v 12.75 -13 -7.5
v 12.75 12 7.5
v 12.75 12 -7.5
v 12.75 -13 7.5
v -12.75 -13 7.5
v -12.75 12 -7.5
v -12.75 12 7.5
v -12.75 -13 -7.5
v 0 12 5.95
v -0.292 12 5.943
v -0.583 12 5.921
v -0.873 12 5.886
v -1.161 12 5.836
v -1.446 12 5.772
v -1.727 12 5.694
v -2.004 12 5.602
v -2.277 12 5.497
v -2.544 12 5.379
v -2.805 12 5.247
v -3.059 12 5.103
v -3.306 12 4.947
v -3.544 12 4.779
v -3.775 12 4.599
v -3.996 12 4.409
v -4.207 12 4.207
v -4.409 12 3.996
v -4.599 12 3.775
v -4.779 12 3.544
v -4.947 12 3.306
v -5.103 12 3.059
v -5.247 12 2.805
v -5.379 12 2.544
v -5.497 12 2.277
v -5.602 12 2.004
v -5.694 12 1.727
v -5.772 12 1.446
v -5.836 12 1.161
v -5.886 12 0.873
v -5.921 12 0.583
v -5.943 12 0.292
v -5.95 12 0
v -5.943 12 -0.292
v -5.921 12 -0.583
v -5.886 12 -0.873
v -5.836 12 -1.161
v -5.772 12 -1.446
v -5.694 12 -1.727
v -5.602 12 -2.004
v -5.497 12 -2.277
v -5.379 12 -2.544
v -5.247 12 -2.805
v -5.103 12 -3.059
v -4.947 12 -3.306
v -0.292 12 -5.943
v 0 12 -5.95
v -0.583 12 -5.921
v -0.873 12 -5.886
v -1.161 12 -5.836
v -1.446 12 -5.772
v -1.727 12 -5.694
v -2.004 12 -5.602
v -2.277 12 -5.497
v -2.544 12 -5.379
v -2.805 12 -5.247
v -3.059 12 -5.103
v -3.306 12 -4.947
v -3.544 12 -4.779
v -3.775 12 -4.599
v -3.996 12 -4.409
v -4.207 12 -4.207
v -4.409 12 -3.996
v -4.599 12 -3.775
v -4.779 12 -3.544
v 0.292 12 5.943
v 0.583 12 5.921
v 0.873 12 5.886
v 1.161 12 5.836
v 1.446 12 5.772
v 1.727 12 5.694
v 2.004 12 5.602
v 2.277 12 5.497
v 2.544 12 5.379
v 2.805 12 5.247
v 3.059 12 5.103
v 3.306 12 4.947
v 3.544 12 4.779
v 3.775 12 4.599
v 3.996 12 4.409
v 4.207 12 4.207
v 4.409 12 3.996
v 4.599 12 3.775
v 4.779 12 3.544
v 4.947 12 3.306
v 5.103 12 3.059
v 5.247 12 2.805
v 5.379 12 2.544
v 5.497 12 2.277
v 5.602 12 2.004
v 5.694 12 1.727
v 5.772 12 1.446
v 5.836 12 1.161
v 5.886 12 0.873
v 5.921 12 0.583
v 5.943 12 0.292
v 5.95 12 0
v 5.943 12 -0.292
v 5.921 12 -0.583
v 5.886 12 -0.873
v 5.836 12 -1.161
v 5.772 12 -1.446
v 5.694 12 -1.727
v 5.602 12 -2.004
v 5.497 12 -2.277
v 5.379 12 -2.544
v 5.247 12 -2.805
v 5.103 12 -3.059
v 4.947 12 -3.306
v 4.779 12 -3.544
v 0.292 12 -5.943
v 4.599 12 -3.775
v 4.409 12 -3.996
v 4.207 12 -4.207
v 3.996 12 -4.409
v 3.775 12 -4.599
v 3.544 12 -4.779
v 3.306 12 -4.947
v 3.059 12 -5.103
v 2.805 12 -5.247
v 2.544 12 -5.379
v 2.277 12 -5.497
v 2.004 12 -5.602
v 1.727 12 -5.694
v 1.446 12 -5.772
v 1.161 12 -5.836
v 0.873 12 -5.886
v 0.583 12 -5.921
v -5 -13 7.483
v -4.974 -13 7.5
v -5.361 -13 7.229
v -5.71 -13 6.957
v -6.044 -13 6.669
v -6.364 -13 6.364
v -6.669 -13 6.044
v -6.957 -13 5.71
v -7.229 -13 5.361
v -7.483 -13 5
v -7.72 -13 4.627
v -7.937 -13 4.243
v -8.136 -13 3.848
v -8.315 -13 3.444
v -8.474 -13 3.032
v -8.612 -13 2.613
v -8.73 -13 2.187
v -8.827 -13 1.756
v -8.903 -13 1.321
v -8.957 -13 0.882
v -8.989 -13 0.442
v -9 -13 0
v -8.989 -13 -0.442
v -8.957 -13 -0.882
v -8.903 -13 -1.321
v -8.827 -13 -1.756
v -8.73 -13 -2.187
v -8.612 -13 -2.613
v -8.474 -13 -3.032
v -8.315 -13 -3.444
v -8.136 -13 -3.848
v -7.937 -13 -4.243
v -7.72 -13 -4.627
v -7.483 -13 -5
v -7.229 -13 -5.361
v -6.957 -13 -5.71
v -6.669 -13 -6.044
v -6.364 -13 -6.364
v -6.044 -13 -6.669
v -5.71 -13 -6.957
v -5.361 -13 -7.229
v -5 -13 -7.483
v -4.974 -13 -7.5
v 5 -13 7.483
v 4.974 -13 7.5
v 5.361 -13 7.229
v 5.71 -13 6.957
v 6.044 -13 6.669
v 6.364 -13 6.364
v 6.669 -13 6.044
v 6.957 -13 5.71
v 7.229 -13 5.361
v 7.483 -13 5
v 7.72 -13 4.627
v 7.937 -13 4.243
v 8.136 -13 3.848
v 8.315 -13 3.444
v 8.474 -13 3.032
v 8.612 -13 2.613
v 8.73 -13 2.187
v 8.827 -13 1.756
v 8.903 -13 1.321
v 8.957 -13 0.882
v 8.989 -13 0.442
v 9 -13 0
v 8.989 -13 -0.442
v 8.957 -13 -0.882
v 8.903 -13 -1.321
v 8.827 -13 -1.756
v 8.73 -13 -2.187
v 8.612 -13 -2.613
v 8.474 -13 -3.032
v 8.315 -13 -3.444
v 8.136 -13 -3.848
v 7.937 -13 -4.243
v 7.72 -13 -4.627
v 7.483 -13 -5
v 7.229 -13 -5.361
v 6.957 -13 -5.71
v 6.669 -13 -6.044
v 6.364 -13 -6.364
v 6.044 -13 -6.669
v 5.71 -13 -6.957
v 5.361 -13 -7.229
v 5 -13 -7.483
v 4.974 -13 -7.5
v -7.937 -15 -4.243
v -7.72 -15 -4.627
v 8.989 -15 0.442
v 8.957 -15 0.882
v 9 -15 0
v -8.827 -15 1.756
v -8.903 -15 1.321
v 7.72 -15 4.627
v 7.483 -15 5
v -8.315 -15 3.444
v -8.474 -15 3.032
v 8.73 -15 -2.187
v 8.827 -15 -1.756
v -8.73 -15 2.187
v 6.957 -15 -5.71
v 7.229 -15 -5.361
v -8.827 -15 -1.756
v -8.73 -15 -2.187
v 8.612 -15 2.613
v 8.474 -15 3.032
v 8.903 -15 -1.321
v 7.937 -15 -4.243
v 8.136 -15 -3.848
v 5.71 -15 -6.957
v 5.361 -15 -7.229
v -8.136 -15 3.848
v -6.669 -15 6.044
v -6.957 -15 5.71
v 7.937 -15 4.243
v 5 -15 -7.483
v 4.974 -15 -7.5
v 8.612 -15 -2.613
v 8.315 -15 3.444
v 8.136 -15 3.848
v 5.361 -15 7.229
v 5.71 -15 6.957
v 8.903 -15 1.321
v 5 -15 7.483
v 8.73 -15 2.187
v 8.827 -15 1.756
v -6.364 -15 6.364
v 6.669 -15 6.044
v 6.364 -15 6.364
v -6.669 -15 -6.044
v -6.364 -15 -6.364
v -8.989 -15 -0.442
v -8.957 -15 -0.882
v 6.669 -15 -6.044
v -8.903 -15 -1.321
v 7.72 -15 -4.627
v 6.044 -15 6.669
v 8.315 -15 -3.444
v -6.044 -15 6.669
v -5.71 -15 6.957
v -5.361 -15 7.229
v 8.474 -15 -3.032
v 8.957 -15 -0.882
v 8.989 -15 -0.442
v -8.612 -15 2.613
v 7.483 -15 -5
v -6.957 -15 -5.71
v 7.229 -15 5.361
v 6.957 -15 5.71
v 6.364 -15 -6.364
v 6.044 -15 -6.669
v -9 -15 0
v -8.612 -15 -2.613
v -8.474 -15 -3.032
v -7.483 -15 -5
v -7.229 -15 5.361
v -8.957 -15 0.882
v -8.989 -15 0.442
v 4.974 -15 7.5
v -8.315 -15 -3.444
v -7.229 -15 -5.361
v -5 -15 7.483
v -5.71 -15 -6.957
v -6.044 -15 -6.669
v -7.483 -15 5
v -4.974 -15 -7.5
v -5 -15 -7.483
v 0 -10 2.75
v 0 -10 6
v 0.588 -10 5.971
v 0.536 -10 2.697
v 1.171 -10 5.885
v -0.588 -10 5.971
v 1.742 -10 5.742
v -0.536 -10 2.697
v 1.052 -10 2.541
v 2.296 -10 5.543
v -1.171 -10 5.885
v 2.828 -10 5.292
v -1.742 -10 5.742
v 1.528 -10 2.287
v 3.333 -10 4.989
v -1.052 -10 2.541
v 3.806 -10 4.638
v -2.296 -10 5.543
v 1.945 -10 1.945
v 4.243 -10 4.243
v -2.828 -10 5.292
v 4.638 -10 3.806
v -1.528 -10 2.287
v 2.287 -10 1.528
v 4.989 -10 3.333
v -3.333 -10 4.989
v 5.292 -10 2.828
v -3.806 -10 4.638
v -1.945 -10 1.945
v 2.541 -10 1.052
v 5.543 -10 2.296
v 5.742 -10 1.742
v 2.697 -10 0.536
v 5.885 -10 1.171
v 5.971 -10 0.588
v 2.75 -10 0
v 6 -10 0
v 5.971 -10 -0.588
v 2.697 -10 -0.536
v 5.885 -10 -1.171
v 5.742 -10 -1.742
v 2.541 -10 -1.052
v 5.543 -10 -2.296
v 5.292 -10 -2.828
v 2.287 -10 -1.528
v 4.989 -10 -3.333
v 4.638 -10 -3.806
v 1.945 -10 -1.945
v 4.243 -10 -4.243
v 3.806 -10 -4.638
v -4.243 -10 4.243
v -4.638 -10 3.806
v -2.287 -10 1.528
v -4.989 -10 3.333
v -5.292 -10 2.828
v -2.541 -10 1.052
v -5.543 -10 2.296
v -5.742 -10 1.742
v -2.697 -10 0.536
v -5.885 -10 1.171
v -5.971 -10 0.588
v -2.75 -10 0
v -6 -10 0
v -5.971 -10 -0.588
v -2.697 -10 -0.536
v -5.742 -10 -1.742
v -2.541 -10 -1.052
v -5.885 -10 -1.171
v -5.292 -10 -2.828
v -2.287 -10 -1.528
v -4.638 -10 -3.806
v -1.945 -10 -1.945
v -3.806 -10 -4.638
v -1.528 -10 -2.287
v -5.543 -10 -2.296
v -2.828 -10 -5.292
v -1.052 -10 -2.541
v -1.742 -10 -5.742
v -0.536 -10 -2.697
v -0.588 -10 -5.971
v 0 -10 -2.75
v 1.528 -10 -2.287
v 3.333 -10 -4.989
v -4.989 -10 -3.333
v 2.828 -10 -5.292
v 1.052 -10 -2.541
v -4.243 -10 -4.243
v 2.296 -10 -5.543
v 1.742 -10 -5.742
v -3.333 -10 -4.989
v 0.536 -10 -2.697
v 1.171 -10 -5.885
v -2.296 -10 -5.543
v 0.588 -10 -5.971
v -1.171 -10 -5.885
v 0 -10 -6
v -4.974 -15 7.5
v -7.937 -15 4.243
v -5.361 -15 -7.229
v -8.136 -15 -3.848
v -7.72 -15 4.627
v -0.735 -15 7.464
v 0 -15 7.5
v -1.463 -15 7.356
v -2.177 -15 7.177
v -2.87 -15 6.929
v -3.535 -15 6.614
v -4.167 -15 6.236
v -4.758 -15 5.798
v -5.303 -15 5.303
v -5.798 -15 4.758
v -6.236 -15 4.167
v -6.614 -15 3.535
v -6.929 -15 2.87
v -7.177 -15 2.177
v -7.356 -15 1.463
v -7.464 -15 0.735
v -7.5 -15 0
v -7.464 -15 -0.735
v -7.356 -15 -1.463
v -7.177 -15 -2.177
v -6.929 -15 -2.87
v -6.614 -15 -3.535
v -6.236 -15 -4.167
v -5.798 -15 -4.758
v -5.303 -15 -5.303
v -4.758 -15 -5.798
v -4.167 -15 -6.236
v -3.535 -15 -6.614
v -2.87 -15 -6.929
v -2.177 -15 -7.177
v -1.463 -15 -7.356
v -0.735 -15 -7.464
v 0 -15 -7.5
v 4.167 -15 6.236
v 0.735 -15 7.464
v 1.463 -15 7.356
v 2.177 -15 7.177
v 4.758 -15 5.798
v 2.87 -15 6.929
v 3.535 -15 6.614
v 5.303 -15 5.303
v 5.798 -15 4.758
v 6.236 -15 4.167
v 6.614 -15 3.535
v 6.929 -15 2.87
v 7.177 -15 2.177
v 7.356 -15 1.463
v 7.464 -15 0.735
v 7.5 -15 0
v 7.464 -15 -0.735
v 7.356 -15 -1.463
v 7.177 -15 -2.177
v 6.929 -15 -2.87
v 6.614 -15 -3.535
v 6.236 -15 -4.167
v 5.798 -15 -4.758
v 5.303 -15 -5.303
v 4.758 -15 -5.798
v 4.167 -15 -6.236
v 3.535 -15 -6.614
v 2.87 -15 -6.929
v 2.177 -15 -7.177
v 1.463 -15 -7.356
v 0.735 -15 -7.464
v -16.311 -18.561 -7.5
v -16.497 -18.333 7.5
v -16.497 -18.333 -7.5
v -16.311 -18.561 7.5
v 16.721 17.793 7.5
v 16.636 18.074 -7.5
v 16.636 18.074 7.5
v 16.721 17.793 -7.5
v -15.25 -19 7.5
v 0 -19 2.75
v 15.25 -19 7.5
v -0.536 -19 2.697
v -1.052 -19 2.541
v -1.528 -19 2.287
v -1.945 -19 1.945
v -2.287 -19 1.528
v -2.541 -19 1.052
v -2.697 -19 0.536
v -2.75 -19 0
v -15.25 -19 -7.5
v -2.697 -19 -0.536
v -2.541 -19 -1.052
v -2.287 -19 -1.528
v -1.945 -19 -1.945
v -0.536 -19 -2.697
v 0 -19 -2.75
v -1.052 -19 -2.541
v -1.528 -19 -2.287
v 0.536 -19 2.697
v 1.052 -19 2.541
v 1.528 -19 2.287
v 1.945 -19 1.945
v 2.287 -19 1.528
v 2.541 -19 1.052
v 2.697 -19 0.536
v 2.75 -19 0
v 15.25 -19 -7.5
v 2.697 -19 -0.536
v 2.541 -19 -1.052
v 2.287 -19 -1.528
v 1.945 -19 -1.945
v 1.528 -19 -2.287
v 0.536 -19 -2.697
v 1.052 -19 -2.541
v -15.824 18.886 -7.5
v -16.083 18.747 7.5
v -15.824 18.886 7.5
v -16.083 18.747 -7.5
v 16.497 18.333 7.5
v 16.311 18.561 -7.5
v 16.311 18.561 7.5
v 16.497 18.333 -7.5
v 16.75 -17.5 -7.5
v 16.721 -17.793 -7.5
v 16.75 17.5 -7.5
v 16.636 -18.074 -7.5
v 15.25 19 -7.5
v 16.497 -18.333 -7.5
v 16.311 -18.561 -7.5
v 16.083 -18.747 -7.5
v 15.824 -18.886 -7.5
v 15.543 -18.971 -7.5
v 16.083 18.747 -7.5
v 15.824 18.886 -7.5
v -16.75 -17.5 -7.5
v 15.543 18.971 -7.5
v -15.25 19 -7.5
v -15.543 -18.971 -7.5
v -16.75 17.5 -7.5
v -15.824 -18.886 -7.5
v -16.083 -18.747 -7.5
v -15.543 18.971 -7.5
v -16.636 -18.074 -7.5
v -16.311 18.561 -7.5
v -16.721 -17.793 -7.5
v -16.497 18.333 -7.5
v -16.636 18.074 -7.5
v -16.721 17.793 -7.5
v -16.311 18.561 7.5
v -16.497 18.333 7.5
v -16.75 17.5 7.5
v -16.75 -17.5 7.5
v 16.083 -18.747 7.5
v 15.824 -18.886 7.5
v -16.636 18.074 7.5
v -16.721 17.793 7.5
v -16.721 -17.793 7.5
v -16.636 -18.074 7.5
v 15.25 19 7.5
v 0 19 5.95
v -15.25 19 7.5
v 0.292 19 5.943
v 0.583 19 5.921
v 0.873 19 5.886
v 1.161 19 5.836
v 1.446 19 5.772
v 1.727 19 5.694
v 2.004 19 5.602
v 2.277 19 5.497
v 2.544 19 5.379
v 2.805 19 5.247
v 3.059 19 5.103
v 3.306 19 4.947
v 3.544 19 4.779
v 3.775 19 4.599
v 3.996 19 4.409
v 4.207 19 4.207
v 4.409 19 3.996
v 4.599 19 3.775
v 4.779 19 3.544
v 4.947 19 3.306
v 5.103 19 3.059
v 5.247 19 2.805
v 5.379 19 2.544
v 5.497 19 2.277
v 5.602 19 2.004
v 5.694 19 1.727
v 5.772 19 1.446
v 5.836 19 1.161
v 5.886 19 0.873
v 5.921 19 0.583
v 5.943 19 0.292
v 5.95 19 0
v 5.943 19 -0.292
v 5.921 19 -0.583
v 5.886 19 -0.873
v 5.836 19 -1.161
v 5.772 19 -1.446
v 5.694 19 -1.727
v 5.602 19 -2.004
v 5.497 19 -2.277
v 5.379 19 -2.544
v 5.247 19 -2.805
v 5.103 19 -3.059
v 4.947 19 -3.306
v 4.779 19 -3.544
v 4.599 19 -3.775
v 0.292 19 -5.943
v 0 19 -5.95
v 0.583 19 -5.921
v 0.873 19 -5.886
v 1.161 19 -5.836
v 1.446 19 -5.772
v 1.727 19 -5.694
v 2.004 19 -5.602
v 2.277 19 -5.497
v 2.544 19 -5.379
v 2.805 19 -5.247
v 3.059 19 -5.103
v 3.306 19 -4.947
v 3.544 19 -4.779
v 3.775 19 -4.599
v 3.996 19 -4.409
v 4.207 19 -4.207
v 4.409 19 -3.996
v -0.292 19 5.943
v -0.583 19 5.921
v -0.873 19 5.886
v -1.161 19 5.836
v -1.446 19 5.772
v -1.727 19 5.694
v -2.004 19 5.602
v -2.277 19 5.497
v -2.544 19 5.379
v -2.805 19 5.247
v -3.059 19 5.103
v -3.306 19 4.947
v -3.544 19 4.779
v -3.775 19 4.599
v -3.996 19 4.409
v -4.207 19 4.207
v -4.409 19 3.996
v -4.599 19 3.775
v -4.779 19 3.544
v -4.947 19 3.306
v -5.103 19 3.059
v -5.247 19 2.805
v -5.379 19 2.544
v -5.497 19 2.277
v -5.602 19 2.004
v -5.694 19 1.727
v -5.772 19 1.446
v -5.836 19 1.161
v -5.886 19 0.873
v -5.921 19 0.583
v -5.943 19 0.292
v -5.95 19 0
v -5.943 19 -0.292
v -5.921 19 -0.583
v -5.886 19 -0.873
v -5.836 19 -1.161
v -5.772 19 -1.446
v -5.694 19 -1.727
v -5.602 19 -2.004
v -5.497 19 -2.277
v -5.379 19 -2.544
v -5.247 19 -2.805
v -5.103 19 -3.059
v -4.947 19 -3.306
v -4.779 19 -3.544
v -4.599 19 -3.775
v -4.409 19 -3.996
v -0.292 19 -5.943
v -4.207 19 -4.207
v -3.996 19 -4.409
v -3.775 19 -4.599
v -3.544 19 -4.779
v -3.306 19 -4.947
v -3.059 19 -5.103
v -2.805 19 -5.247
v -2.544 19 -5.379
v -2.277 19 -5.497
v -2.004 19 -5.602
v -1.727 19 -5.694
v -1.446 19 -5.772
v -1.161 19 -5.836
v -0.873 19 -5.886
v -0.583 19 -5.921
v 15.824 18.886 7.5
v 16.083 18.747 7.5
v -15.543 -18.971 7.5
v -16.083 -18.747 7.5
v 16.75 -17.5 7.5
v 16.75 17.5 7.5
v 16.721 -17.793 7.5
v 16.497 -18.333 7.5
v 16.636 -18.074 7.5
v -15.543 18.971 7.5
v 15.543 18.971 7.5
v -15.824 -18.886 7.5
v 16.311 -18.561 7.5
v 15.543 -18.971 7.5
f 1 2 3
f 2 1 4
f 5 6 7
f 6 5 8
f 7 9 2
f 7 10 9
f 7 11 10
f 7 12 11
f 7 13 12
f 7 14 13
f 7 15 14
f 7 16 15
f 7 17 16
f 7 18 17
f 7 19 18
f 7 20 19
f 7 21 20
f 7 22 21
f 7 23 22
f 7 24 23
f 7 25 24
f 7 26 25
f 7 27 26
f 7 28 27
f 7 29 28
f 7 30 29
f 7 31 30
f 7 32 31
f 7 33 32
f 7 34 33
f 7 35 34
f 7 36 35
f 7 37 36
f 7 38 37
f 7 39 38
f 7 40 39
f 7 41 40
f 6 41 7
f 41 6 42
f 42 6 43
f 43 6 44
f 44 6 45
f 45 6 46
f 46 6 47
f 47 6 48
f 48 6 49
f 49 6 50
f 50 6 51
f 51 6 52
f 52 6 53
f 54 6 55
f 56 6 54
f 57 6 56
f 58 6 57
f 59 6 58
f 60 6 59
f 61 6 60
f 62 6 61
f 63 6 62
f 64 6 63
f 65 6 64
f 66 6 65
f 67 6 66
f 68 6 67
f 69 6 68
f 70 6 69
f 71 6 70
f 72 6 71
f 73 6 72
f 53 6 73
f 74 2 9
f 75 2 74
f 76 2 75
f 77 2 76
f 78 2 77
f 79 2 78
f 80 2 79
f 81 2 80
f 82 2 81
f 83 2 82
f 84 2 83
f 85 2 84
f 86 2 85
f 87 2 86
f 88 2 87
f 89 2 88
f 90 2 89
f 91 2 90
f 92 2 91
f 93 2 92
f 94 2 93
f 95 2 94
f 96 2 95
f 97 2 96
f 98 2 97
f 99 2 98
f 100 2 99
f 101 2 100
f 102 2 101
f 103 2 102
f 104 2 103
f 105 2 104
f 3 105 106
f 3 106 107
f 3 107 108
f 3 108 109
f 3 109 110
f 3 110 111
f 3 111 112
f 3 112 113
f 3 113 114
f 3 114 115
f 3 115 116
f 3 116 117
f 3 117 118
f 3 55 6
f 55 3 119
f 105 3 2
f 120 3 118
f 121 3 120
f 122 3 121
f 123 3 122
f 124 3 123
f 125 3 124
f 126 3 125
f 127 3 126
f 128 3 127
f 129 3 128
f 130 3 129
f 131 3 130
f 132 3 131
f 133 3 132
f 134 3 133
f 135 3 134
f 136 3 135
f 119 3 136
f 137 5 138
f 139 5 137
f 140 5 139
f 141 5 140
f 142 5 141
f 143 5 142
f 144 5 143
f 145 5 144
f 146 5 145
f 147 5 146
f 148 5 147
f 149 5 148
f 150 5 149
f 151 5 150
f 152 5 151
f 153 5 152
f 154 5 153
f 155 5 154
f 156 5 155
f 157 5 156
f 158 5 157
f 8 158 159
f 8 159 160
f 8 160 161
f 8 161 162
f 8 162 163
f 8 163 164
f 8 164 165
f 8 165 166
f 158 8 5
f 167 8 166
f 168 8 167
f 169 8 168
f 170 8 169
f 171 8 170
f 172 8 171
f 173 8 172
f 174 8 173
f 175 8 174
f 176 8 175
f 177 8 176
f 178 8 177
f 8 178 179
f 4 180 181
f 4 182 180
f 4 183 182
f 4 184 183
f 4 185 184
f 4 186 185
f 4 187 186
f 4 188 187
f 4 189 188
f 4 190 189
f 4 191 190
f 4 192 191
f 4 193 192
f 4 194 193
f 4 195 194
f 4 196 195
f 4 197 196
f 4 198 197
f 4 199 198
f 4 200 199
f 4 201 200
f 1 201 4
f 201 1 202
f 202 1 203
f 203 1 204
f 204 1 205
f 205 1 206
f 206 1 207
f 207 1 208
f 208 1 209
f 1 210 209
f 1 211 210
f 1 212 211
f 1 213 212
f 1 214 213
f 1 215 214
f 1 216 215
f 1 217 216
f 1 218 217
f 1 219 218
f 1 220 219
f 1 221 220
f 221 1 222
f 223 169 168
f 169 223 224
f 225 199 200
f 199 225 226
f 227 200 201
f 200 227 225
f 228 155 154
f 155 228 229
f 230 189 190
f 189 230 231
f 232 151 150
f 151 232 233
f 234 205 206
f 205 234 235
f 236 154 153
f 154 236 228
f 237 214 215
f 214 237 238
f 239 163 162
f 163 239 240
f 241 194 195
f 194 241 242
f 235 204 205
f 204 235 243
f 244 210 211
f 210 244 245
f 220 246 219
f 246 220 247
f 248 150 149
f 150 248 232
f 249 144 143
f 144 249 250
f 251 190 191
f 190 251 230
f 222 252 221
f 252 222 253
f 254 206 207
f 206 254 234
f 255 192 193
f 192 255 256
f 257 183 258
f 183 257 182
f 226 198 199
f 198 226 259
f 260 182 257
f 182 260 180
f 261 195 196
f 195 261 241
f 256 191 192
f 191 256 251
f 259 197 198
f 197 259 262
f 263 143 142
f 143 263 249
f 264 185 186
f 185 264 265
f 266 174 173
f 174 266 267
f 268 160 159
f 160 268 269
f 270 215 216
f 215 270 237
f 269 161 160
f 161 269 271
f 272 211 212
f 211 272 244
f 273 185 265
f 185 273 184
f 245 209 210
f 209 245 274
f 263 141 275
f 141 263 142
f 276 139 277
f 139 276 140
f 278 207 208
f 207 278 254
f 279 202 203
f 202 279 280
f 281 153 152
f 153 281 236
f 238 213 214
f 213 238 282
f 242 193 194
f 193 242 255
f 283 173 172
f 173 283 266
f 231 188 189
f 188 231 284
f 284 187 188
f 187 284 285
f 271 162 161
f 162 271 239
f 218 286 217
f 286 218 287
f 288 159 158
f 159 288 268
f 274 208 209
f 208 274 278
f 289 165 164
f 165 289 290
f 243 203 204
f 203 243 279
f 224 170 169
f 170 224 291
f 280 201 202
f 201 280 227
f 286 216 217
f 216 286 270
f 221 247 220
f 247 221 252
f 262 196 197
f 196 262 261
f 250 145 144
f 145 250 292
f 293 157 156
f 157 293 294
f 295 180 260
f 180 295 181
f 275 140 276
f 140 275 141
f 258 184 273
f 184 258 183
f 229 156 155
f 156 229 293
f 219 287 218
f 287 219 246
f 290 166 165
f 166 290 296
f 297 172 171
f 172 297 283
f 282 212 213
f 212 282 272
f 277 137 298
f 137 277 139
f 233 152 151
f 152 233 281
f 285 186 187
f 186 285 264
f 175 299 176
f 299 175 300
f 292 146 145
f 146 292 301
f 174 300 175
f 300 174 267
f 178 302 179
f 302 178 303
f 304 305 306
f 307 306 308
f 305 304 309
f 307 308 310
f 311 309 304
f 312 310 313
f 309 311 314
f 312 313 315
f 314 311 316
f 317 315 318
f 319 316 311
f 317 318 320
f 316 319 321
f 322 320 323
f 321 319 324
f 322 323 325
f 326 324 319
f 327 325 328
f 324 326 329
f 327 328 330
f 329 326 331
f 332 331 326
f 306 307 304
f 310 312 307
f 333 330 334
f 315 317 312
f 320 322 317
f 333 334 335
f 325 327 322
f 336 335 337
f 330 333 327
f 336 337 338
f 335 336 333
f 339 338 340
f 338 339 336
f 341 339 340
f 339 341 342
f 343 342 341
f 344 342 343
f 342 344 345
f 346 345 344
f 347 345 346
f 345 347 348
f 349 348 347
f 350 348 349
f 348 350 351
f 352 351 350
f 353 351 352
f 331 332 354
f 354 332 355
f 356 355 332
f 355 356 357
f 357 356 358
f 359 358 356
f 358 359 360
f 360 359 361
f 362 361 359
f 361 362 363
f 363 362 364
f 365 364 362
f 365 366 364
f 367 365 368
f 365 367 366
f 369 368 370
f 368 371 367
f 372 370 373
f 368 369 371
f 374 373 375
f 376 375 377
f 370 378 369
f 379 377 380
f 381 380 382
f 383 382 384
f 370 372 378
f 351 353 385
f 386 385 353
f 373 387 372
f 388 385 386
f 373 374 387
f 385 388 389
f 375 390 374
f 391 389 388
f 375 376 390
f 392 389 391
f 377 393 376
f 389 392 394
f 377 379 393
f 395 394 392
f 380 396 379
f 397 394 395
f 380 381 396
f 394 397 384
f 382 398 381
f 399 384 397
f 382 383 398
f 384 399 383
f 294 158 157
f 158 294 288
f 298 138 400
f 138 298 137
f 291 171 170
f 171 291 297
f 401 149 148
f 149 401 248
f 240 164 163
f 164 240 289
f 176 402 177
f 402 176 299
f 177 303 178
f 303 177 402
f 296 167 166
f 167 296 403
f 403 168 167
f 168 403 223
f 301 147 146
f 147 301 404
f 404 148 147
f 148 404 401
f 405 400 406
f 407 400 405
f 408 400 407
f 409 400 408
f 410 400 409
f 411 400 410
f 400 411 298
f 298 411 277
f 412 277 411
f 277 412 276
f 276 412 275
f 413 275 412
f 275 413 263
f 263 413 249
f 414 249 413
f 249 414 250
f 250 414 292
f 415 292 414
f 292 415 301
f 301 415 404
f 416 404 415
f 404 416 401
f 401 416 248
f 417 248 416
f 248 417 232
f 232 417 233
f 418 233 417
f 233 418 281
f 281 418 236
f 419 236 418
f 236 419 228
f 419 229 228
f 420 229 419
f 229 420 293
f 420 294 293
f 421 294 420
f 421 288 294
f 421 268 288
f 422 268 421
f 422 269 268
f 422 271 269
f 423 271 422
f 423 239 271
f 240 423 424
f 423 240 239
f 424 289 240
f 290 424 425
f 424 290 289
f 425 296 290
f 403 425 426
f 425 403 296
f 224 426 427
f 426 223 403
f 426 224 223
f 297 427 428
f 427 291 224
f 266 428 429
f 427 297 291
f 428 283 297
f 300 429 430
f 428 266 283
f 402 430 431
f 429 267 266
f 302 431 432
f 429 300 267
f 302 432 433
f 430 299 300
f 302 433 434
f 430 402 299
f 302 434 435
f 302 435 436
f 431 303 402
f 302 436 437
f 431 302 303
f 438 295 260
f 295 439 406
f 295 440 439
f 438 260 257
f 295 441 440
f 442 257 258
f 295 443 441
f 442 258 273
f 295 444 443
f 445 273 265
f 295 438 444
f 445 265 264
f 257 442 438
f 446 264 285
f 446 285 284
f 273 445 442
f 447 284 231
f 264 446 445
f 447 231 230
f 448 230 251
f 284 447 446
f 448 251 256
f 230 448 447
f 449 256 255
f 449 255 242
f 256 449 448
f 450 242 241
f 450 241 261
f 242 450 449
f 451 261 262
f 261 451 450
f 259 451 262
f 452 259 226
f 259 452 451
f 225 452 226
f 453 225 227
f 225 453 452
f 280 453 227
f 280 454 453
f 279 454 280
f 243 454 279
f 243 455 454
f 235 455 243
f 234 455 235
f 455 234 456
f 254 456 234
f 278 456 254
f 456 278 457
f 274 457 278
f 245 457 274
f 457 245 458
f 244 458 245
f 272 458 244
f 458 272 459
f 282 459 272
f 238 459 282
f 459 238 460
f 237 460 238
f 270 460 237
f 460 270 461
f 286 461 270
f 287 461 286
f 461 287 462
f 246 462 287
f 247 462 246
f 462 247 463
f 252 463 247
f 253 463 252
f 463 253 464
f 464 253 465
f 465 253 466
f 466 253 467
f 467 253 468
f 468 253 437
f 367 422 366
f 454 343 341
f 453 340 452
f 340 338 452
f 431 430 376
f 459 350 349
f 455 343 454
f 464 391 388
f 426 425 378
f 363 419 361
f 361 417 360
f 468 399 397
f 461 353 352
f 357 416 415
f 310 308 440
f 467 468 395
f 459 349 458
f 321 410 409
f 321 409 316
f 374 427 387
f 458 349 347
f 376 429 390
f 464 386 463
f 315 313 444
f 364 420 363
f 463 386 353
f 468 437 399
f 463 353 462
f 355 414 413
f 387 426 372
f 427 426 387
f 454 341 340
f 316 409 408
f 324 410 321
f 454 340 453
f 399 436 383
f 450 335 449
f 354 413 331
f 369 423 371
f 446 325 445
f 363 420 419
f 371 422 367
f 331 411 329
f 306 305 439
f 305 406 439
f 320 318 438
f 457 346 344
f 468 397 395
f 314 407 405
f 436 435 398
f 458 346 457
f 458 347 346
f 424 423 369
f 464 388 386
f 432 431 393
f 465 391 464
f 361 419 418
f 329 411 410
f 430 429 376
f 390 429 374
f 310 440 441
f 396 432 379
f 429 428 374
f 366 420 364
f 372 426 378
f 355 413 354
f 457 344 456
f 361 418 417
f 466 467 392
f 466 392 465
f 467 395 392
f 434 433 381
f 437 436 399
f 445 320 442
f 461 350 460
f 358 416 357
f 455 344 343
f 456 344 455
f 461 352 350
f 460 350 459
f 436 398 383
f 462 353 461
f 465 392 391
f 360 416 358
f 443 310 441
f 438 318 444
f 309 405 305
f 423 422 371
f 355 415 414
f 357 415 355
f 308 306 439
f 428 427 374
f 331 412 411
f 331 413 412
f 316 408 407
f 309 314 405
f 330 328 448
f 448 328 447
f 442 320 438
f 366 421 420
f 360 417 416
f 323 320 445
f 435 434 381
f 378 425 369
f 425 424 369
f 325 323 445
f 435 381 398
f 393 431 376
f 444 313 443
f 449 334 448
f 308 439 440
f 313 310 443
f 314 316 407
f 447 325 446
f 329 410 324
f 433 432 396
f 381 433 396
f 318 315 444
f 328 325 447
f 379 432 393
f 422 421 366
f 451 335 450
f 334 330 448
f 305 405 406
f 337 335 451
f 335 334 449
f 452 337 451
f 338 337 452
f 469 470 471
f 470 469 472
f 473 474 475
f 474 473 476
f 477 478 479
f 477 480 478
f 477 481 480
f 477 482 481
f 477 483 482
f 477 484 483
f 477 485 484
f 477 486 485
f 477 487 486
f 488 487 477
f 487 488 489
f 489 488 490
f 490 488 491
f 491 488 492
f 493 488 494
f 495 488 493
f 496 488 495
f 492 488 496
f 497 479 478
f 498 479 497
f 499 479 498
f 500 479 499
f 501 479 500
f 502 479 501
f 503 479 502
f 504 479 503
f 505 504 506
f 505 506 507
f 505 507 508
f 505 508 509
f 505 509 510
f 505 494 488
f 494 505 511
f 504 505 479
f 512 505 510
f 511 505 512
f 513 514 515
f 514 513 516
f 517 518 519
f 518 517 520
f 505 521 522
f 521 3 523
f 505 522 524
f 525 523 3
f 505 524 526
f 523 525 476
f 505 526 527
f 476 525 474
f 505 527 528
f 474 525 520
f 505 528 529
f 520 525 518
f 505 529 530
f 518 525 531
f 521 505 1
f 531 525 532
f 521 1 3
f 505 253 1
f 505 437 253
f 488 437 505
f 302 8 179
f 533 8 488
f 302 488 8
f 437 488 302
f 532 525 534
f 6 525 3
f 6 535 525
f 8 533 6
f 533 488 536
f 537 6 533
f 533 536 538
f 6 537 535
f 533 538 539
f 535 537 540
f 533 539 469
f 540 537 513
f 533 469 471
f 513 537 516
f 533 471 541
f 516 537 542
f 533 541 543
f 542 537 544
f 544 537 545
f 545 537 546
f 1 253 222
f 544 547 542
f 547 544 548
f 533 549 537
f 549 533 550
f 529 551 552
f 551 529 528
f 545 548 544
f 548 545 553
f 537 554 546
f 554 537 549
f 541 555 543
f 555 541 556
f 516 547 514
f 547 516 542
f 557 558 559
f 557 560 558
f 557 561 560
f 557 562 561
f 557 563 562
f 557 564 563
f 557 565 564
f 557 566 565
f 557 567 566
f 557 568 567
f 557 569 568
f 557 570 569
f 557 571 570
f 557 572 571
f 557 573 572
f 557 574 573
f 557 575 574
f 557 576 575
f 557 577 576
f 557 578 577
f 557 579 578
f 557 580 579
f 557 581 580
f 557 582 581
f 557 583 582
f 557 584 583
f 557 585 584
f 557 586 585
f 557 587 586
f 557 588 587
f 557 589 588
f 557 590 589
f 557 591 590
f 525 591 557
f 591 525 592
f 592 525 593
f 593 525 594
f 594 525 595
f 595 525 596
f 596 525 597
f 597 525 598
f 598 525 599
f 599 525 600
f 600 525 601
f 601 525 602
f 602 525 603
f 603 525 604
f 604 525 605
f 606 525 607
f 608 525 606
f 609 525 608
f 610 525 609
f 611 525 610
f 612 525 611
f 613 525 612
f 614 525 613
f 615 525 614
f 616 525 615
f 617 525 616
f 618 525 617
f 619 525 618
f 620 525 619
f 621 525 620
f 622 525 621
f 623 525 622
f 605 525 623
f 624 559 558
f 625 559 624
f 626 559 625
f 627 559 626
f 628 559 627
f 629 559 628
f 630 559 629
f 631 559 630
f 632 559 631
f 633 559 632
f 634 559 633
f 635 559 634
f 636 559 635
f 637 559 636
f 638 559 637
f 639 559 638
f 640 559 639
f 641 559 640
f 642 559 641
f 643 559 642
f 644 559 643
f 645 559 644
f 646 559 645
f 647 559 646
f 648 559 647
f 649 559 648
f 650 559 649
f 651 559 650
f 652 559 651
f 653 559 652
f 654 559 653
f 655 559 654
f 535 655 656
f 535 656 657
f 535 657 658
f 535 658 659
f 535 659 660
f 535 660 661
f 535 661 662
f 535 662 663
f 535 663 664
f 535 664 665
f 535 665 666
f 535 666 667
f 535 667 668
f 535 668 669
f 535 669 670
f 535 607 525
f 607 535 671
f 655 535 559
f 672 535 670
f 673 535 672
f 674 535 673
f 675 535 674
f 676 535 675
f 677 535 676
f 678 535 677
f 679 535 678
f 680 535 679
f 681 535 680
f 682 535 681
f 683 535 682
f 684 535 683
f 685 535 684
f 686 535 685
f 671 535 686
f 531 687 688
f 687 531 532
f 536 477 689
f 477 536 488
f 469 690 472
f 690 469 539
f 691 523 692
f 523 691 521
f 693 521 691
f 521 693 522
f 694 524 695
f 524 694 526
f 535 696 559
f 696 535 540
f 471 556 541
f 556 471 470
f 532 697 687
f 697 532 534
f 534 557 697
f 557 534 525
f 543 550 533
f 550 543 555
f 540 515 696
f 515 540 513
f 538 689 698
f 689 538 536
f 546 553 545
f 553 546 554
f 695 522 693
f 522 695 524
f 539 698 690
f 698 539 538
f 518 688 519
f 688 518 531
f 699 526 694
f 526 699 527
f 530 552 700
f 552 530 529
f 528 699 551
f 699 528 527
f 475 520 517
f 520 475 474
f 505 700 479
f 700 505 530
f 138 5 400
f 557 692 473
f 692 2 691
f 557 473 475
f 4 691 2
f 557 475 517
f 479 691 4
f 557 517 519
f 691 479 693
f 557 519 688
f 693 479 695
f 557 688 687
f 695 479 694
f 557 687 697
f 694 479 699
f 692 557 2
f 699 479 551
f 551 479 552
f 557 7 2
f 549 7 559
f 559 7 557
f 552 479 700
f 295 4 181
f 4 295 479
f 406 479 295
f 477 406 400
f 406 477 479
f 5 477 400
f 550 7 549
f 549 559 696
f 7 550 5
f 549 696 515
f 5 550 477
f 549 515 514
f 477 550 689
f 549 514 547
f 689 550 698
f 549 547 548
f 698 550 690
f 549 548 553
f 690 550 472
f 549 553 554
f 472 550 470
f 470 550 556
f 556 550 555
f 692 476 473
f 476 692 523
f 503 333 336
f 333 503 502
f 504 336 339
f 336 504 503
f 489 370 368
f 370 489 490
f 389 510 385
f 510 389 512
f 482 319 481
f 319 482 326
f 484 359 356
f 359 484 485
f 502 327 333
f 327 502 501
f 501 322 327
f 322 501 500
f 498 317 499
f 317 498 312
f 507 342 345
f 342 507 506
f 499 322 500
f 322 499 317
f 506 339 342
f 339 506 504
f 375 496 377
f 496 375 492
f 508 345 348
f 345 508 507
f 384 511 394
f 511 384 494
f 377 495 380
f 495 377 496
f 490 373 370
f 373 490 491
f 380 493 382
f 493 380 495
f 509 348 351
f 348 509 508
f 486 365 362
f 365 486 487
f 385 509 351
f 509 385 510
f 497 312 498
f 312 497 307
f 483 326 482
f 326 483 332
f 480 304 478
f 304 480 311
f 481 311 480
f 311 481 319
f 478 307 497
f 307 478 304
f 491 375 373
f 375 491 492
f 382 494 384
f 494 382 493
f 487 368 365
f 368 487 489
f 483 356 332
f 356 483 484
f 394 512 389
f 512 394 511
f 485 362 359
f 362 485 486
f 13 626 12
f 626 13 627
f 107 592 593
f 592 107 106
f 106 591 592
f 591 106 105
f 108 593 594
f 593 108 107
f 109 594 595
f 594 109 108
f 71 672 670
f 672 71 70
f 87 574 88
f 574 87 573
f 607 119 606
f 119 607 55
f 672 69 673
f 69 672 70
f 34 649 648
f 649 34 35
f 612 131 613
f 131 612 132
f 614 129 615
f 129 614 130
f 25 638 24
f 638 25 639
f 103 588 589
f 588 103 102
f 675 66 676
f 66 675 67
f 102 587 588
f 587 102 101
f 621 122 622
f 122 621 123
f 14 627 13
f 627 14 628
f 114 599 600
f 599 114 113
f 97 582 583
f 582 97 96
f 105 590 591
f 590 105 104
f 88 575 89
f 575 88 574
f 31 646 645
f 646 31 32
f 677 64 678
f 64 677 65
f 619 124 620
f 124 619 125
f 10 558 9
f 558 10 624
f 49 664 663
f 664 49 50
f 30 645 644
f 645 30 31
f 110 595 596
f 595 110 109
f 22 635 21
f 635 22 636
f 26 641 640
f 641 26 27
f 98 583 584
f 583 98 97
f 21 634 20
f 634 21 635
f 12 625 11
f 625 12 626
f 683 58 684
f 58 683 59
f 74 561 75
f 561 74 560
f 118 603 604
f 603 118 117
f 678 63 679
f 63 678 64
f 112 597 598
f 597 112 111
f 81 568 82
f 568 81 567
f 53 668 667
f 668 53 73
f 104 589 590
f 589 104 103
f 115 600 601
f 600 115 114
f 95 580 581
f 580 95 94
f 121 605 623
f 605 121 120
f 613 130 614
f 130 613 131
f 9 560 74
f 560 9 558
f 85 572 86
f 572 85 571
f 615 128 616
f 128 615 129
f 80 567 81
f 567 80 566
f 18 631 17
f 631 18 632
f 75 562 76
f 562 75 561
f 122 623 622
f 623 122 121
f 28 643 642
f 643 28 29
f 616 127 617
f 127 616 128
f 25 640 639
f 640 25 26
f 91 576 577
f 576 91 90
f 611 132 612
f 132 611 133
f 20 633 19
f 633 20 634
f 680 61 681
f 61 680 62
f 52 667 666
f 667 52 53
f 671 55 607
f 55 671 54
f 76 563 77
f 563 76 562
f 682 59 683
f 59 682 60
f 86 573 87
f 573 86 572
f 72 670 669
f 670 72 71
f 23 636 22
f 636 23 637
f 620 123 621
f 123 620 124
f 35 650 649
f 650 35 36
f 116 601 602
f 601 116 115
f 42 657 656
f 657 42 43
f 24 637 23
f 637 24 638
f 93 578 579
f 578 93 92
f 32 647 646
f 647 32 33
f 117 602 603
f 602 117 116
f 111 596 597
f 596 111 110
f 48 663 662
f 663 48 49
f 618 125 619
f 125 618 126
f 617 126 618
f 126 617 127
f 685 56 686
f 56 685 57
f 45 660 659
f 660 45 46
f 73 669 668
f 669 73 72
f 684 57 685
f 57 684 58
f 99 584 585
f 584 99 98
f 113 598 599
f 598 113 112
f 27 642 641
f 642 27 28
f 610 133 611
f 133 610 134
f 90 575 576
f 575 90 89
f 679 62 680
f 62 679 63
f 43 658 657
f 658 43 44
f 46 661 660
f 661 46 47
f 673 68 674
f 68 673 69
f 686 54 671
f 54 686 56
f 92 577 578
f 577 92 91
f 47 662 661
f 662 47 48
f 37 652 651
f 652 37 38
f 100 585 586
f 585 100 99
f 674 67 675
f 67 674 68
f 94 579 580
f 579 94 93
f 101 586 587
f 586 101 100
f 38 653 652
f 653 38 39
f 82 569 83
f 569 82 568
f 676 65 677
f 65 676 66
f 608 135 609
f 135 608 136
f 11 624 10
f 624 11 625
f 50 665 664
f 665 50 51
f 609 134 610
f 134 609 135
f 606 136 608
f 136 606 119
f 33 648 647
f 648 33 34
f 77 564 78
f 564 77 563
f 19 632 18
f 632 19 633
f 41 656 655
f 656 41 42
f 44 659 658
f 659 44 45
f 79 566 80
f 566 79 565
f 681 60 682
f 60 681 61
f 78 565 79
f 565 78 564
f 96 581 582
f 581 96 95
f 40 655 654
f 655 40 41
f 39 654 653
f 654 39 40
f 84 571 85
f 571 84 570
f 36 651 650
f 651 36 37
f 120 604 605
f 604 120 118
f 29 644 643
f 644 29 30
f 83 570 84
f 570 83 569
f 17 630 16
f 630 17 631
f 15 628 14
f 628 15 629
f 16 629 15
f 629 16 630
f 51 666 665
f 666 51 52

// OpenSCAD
PrintMic = false;//true;

H = 15;

Dmic = 9.8;
Dspk = 11.9;

module frame(){
minkowski(){
    cylinder(d=3,h=H/2,$fn=32, center=true);
    cube([25.5+5, 35,H/2],center=true);
    }
}

module spring(){
    difference(){
        cylinder(d=18,h=15,$fn=128);
        translate([0,0,10])cylinder(d1=12,d2=15,h=5,$fn=64);
    }
}
difference(){
    frame();
    difference(){
        translate([-25.5/2,-13,-H/2-0.1]) cube([25.5,25,H+0.2]);
        rotate(90,[1,0,0]) translate ([0,0,10]) cylinder(d=18,h=10,$fn=128);
    }
    rotate(90,[1,0,0]) cylinder(d=5.5, h=40, center=true, $fn=32);
    rotate(90,[1,0,0]) spring();    

    if (PrintMic){
        rotate(-90,[1,0,0]) cylinder(d=Dmic,h=50,$fn=128);

        translate([4.8,0,9.7/2]) rotate(-90,[1,0,0]) cylinder(d=2.4,h=50,$fn=16);
        translate([4.8,0,-9.7/2]) rotate(-90,[1,0,0]) cylinder(d=2.4,h=50,$fn=16);
    } else {
        rotate(-90,[1,0,0]) cylinder(d=Dspk,h=50,$fn=128);
    }

}
